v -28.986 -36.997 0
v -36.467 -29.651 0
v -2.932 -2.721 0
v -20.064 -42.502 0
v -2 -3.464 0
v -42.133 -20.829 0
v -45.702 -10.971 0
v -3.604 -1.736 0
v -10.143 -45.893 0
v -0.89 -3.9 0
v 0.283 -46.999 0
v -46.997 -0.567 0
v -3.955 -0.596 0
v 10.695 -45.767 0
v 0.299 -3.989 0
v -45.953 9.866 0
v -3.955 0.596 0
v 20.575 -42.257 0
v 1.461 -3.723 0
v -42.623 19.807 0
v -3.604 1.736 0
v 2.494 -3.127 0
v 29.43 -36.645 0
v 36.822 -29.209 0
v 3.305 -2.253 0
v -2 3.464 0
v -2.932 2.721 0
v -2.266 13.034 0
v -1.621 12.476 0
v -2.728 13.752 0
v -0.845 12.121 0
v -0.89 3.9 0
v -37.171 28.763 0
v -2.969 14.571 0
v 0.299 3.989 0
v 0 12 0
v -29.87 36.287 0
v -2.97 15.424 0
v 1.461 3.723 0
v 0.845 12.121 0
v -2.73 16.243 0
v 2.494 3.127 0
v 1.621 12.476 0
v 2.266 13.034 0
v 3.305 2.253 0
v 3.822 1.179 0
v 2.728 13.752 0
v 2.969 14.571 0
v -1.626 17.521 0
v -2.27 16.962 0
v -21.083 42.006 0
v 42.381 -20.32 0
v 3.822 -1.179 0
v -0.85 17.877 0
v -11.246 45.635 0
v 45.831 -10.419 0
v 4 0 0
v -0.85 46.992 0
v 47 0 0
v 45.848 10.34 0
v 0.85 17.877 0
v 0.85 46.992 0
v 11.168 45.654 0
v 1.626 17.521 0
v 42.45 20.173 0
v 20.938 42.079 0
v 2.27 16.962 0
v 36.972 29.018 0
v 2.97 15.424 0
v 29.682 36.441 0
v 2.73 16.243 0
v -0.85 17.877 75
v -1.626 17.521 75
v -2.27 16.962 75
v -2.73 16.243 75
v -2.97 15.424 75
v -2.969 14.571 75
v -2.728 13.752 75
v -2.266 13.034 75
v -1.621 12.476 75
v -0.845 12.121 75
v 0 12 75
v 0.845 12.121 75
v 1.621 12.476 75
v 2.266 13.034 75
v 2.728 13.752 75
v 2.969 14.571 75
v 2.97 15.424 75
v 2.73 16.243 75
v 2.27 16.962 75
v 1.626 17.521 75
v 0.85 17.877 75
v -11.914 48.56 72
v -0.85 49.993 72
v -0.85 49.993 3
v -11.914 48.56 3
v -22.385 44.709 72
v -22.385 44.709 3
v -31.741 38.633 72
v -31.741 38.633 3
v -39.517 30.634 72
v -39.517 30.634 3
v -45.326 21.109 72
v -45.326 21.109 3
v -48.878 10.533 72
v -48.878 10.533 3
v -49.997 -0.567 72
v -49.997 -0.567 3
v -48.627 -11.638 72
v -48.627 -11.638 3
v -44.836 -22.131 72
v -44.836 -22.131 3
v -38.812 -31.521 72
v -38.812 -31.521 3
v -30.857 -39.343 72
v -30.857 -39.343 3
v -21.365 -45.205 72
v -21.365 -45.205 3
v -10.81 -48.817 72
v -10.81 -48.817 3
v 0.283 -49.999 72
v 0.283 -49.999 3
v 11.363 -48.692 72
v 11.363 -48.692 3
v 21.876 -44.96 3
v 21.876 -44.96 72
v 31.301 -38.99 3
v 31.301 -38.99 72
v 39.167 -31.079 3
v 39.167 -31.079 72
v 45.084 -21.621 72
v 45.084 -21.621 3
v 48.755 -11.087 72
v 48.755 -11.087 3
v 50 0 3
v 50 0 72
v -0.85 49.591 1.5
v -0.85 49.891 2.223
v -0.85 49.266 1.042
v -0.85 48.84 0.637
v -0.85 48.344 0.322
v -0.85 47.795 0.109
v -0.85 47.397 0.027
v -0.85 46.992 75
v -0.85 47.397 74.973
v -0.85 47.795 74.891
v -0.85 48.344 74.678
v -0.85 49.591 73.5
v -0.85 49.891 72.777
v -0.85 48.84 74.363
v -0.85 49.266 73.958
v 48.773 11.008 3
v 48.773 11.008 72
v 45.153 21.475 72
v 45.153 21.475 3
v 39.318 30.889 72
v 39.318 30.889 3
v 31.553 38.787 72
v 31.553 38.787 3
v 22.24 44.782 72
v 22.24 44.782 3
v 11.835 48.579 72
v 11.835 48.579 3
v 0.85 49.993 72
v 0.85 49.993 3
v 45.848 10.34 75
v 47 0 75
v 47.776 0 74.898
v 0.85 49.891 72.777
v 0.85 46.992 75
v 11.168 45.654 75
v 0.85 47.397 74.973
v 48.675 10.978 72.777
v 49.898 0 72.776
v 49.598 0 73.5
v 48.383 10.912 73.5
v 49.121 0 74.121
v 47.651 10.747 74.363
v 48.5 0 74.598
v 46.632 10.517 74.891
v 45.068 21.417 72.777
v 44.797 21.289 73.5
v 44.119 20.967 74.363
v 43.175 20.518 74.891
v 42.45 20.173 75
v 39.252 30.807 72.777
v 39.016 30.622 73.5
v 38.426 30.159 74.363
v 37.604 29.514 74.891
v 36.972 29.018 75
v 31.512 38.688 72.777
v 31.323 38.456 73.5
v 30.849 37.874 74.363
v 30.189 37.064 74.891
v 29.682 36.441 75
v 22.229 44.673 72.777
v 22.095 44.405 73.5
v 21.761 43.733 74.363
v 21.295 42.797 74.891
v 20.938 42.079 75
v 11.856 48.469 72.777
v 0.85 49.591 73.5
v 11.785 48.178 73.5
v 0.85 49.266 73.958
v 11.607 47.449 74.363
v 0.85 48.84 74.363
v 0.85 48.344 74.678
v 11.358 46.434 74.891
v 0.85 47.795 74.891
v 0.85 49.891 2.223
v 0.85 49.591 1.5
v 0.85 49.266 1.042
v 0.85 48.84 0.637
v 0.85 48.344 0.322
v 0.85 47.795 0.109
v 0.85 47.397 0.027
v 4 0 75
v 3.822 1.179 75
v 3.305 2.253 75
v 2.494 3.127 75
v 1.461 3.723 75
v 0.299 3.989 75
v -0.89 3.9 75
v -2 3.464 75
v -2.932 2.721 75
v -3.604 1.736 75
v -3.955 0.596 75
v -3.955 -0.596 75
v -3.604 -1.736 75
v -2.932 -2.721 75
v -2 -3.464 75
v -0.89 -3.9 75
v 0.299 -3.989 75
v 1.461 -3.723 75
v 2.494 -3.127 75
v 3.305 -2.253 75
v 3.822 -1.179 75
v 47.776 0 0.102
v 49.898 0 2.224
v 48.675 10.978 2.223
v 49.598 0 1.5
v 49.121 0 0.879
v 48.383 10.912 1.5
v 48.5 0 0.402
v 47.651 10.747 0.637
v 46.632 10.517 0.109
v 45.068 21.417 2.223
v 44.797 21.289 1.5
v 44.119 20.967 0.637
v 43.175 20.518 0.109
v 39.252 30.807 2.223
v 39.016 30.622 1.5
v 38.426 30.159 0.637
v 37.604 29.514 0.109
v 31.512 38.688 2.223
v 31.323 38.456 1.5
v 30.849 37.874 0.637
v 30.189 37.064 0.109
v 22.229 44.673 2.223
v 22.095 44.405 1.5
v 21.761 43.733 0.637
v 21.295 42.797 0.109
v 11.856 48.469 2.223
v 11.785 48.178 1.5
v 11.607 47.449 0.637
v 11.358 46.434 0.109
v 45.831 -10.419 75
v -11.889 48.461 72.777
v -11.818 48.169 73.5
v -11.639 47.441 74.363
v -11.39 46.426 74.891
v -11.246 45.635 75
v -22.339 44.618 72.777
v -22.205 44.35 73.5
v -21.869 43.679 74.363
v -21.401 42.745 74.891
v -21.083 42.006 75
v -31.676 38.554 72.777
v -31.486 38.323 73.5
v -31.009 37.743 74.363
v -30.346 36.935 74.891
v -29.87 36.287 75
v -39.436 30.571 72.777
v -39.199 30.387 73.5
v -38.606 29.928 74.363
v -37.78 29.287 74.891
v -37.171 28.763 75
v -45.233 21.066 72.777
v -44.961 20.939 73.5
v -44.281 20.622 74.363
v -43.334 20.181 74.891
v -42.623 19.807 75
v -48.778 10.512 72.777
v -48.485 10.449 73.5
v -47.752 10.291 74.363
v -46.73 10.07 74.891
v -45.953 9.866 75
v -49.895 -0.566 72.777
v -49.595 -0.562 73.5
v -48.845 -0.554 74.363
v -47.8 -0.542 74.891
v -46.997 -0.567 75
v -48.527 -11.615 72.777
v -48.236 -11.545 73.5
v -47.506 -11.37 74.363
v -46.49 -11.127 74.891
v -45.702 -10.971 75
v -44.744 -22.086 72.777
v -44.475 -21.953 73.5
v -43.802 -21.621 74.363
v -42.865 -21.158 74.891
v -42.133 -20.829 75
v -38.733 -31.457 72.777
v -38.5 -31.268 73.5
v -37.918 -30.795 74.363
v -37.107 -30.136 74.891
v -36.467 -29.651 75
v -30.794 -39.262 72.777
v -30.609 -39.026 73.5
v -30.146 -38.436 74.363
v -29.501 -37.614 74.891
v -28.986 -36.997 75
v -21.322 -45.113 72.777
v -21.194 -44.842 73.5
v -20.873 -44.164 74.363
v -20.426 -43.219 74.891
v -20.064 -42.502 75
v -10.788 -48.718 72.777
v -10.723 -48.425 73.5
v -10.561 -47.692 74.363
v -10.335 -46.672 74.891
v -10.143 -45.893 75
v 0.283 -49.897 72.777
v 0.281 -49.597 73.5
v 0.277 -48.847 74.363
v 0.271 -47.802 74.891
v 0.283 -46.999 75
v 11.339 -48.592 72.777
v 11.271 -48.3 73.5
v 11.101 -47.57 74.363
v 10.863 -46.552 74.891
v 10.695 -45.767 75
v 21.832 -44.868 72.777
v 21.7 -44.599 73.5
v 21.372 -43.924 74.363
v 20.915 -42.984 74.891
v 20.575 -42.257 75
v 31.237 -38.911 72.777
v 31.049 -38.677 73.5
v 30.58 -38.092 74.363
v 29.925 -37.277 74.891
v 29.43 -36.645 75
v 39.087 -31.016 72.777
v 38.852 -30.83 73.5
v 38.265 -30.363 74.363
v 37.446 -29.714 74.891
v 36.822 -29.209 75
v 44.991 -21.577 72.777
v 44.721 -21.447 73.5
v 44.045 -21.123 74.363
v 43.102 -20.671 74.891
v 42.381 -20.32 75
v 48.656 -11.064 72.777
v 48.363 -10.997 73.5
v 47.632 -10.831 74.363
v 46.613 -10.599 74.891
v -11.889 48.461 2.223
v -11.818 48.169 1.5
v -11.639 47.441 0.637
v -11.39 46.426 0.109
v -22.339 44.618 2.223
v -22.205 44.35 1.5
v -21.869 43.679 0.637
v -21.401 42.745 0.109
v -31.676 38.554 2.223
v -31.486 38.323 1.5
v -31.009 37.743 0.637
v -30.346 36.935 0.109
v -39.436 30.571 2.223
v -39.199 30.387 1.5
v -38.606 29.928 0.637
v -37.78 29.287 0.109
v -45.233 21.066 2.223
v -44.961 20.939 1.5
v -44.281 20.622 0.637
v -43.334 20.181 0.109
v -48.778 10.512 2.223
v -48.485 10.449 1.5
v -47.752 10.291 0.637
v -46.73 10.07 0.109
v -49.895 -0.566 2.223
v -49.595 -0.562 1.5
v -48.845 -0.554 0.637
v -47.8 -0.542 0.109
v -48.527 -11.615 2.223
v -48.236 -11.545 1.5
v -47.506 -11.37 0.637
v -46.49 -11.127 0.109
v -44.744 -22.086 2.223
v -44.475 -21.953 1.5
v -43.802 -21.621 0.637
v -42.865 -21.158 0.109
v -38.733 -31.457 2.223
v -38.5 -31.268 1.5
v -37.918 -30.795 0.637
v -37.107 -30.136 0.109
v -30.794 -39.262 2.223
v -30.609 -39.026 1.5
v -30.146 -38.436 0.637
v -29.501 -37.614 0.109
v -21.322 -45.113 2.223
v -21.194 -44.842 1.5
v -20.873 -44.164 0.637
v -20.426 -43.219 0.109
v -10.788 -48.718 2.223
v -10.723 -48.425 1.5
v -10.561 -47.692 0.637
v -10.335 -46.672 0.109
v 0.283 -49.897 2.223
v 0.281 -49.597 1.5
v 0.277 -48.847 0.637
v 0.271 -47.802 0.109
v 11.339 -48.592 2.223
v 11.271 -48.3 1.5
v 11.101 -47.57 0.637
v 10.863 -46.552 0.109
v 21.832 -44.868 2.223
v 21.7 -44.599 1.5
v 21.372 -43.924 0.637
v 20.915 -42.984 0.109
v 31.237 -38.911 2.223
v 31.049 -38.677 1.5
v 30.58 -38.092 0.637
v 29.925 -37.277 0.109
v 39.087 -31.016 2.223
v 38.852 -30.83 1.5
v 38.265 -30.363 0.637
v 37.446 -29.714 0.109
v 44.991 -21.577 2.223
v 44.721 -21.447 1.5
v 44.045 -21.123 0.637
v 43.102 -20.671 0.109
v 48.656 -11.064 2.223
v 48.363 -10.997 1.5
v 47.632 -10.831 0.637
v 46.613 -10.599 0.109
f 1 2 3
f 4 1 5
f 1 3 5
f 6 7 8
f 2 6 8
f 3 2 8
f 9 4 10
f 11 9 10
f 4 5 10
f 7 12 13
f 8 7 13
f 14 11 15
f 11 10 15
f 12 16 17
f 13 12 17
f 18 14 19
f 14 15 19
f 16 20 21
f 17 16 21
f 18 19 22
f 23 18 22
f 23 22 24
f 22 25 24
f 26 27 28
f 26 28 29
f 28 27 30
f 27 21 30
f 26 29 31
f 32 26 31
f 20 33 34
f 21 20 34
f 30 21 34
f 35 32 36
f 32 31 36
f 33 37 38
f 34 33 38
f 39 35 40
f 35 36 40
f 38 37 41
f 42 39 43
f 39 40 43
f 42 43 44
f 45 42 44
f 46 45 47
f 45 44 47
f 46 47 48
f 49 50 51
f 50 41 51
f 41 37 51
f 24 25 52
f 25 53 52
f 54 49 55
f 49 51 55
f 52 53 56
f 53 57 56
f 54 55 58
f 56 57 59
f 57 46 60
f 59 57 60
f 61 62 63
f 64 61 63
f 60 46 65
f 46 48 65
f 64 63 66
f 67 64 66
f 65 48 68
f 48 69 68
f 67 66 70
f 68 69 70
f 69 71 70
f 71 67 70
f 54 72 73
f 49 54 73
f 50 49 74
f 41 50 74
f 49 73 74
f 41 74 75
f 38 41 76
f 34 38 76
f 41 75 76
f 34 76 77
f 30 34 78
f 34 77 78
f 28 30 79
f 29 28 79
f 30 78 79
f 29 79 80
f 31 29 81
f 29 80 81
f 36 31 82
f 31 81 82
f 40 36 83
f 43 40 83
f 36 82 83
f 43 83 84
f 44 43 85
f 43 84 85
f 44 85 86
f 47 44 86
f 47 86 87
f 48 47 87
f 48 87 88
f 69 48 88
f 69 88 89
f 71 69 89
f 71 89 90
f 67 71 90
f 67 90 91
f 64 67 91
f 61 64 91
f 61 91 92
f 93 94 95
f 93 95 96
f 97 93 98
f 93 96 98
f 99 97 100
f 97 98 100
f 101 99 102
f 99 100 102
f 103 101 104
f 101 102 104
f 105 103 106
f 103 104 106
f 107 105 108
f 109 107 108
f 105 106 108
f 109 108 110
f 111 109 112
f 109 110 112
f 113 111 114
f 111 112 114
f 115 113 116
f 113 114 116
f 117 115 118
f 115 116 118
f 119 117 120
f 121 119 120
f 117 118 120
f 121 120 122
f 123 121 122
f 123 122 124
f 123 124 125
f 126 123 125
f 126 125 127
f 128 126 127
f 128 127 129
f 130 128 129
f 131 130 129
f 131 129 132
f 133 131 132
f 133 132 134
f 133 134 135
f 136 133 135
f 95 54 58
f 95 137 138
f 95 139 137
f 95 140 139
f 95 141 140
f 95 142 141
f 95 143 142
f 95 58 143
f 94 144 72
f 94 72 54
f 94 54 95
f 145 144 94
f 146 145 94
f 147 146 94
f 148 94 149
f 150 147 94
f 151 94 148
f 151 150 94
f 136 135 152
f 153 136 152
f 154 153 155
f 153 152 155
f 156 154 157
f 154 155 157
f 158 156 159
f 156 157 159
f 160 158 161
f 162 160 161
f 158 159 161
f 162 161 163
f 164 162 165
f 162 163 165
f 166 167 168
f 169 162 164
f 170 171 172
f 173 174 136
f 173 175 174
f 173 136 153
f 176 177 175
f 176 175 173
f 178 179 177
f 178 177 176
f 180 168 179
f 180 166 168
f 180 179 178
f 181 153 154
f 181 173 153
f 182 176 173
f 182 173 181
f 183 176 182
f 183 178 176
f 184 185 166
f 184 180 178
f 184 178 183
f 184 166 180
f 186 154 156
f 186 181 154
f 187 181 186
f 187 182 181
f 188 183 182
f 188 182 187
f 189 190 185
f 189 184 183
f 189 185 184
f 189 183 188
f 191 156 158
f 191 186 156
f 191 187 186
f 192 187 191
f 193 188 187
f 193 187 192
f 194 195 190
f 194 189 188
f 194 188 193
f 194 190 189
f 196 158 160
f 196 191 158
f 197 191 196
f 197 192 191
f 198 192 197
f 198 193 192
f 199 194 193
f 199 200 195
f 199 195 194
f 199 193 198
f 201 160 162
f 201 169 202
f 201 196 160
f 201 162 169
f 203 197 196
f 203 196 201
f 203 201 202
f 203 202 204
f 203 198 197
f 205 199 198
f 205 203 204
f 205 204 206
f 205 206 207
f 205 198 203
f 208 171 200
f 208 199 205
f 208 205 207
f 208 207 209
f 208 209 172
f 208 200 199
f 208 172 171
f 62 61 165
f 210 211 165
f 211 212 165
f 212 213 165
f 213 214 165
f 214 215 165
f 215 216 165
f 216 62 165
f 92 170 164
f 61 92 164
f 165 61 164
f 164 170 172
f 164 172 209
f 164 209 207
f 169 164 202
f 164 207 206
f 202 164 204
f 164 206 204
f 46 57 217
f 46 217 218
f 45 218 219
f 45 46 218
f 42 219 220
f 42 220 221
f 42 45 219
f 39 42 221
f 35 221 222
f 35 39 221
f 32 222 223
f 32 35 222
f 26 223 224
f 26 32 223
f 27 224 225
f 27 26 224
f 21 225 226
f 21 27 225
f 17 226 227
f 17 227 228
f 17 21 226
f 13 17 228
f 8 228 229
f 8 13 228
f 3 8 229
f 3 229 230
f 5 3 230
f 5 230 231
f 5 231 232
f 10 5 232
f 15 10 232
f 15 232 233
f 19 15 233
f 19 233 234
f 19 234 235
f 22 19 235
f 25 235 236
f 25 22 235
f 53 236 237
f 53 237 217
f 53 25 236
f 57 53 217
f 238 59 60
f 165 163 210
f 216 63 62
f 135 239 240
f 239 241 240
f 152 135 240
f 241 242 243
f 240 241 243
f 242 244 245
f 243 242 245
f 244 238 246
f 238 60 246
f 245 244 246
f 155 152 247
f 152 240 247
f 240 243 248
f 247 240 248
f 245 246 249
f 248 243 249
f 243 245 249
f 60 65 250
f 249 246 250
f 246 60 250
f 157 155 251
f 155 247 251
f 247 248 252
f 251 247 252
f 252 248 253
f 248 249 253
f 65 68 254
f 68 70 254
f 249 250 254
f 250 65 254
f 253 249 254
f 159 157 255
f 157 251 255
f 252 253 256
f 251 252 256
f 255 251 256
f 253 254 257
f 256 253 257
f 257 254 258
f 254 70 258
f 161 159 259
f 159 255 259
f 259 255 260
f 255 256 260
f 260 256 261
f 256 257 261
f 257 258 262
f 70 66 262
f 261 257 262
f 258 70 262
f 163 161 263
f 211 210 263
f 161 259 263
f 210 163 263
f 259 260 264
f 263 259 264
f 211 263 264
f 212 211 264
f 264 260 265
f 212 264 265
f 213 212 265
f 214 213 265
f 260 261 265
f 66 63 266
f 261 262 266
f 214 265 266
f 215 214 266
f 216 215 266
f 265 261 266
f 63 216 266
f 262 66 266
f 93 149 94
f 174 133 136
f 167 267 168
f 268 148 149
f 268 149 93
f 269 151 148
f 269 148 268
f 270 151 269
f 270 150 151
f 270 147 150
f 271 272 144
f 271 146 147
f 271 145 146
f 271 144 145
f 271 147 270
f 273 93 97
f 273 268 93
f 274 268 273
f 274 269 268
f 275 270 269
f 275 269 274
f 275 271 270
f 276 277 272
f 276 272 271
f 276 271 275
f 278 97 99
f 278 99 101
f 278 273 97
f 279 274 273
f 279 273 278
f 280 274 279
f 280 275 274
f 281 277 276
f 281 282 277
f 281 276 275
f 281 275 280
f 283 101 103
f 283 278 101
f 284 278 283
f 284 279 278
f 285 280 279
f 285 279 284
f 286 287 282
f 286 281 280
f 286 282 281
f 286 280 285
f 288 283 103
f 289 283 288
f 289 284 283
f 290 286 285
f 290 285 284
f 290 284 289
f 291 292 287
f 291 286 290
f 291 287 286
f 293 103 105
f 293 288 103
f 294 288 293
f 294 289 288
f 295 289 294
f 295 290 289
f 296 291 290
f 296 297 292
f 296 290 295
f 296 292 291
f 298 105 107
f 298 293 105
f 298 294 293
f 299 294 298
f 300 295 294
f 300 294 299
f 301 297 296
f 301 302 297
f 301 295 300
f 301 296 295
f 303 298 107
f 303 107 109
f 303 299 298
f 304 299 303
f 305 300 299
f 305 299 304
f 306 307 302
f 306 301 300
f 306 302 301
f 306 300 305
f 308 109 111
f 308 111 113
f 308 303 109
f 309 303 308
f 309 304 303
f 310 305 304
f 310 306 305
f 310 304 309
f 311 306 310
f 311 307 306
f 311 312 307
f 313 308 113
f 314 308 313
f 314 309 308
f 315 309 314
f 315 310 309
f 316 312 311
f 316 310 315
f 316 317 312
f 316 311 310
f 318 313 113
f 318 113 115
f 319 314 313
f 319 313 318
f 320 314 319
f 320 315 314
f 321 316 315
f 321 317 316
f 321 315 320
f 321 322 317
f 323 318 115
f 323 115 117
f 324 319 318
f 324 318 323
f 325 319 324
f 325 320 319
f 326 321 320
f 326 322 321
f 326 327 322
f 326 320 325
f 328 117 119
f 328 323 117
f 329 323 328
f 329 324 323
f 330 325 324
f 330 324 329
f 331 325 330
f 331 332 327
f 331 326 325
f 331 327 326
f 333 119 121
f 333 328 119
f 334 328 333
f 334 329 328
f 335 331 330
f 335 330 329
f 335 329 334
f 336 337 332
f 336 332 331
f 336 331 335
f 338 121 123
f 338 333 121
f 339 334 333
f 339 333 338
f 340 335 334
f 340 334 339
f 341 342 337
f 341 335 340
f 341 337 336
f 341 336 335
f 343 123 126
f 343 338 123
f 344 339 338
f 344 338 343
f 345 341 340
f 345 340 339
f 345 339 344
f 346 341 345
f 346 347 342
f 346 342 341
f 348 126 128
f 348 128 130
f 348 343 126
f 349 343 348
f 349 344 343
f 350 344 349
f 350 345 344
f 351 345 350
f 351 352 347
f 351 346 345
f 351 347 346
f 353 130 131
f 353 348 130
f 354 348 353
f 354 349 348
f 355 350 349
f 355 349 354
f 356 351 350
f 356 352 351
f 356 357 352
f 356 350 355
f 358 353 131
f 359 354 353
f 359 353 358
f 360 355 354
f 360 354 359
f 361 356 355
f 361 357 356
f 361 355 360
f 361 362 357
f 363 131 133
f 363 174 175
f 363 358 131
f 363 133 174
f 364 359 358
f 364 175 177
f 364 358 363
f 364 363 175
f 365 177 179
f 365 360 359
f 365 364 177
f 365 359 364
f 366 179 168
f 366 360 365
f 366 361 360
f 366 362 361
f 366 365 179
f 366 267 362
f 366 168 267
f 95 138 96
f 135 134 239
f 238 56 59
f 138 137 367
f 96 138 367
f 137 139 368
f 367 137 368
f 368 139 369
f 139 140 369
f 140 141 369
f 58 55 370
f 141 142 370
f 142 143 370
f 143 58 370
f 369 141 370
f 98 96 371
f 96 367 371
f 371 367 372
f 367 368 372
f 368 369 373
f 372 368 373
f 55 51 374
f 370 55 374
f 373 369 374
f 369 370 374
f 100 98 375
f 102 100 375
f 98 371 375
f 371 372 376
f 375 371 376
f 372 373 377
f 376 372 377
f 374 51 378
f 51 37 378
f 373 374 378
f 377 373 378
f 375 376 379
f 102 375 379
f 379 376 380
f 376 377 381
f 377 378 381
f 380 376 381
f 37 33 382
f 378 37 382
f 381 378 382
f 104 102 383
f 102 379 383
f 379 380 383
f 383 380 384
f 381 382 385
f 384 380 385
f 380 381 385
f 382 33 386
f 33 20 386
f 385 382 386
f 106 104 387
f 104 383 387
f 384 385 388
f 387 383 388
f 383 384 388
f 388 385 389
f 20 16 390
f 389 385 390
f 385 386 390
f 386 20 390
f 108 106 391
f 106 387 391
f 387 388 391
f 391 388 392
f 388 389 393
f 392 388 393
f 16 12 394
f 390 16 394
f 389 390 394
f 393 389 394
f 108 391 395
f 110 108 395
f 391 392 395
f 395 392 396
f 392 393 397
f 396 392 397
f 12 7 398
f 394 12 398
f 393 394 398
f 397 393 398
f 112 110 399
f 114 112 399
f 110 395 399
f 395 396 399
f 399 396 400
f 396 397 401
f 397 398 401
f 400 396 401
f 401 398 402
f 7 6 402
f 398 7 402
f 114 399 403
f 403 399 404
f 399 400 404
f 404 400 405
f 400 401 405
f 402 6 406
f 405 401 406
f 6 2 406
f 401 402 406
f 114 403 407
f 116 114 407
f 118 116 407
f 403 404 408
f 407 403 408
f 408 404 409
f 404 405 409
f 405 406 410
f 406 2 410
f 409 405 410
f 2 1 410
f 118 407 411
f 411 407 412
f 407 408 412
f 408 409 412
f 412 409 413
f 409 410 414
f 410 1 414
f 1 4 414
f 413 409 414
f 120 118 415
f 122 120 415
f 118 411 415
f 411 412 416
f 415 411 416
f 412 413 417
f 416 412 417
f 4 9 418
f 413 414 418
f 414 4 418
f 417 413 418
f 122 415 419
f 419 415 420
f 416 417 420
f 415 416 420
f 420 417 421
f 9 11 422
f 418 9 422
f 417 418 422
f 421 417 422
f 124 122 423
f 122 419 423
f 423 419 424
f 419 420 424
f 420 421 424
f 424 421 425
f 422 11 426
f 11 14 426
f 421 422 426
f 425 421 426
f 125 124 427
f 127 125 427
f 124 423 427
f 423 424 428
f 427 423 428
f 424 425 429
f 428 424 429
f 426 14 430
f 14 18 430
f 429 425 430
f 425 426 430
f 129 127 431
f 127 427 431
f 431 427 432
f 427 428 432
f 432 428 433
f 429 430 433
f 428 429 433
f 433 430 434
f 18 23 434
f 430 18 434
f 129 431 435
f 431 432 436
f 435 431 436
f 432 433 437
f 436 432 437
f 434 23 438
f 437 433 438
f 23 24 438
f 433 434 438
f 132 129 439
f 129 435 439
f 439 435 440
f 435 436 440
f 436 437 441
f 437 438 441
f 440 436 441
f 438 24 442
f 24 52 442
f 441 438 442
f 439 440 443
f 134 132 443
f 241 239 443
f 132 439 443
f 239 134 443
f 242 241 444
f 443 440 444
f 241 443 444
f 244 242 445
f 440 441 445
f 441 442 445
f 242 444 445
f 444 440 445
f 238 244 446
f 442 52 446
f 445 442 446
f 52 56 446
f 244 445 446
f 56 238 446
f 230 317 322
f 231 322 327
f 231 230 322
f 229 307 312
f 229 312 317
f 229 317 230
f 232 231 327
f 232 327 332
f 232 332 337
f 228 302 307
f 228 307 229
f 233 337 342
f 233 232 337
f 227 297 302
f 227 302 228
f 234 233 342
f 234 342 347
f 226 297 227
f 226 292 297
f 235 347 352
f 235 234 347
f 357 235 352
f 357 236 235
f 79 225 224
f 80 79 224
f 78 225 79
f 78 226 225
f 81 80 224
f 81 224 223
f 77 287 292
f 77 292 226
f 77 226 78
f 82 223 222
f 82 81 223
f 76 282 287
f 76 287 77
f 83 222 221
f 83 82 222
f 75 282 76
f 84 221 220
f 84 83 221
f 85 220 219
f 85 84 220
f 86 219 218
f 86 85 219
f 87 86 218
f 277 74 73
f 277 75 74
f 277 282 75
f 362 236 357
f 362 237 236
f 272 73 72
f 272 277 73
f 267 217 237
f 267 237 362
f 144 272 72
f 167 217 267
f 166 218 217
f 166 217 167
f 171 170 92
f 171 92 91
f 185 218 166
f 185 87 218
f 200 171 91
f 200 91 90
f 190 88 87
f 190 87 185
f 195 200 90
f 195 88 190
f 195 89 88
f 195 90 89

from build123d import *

# Parameters (mm, degrees)
SKETCH_R     = 50
SKETCH_R_2   = 4
PAD_DEPTH    = 75
FILLET_R     = 3
SKETCH001_R  = 3
SKETCH001_W  = 1.7
SKETCH001_H  = 50
POCKET_DEPTH = 75.001


with BuildPart() as part:
    # Sketch → Pad (new body)
    with BuildSketch(Plane.XY):
        Circle(SKETCH_R)
        Circle(SKETCH_R_2, mode=Mode.SUBTRACT)
    extrude(amount=PAD_DEPTH)

    # Fillet
    fillet_edges = [part.edges().sort_by_distance(p)[0] for p in [
        (-50, 0, 0),
        (-50, 0, 75),
    ]]
    fillet(fillet_edges, radius=FILLET_R)

    # Sketch001 (on Face5 of Fillet) → Pocket (cut, through all)
    with BuildSketch(Plane.XY.offset(75)):
        with Locations((0, 15)):
            Circle(SKETCH001_R)
        with Locations((0, 40)):
            Rectangle(SKETCH001_W, SKETCH001_H)
    extrude(amount=-POCKET_DEPTH, mode=Mode.SUBTRACT)


solid = part.part
